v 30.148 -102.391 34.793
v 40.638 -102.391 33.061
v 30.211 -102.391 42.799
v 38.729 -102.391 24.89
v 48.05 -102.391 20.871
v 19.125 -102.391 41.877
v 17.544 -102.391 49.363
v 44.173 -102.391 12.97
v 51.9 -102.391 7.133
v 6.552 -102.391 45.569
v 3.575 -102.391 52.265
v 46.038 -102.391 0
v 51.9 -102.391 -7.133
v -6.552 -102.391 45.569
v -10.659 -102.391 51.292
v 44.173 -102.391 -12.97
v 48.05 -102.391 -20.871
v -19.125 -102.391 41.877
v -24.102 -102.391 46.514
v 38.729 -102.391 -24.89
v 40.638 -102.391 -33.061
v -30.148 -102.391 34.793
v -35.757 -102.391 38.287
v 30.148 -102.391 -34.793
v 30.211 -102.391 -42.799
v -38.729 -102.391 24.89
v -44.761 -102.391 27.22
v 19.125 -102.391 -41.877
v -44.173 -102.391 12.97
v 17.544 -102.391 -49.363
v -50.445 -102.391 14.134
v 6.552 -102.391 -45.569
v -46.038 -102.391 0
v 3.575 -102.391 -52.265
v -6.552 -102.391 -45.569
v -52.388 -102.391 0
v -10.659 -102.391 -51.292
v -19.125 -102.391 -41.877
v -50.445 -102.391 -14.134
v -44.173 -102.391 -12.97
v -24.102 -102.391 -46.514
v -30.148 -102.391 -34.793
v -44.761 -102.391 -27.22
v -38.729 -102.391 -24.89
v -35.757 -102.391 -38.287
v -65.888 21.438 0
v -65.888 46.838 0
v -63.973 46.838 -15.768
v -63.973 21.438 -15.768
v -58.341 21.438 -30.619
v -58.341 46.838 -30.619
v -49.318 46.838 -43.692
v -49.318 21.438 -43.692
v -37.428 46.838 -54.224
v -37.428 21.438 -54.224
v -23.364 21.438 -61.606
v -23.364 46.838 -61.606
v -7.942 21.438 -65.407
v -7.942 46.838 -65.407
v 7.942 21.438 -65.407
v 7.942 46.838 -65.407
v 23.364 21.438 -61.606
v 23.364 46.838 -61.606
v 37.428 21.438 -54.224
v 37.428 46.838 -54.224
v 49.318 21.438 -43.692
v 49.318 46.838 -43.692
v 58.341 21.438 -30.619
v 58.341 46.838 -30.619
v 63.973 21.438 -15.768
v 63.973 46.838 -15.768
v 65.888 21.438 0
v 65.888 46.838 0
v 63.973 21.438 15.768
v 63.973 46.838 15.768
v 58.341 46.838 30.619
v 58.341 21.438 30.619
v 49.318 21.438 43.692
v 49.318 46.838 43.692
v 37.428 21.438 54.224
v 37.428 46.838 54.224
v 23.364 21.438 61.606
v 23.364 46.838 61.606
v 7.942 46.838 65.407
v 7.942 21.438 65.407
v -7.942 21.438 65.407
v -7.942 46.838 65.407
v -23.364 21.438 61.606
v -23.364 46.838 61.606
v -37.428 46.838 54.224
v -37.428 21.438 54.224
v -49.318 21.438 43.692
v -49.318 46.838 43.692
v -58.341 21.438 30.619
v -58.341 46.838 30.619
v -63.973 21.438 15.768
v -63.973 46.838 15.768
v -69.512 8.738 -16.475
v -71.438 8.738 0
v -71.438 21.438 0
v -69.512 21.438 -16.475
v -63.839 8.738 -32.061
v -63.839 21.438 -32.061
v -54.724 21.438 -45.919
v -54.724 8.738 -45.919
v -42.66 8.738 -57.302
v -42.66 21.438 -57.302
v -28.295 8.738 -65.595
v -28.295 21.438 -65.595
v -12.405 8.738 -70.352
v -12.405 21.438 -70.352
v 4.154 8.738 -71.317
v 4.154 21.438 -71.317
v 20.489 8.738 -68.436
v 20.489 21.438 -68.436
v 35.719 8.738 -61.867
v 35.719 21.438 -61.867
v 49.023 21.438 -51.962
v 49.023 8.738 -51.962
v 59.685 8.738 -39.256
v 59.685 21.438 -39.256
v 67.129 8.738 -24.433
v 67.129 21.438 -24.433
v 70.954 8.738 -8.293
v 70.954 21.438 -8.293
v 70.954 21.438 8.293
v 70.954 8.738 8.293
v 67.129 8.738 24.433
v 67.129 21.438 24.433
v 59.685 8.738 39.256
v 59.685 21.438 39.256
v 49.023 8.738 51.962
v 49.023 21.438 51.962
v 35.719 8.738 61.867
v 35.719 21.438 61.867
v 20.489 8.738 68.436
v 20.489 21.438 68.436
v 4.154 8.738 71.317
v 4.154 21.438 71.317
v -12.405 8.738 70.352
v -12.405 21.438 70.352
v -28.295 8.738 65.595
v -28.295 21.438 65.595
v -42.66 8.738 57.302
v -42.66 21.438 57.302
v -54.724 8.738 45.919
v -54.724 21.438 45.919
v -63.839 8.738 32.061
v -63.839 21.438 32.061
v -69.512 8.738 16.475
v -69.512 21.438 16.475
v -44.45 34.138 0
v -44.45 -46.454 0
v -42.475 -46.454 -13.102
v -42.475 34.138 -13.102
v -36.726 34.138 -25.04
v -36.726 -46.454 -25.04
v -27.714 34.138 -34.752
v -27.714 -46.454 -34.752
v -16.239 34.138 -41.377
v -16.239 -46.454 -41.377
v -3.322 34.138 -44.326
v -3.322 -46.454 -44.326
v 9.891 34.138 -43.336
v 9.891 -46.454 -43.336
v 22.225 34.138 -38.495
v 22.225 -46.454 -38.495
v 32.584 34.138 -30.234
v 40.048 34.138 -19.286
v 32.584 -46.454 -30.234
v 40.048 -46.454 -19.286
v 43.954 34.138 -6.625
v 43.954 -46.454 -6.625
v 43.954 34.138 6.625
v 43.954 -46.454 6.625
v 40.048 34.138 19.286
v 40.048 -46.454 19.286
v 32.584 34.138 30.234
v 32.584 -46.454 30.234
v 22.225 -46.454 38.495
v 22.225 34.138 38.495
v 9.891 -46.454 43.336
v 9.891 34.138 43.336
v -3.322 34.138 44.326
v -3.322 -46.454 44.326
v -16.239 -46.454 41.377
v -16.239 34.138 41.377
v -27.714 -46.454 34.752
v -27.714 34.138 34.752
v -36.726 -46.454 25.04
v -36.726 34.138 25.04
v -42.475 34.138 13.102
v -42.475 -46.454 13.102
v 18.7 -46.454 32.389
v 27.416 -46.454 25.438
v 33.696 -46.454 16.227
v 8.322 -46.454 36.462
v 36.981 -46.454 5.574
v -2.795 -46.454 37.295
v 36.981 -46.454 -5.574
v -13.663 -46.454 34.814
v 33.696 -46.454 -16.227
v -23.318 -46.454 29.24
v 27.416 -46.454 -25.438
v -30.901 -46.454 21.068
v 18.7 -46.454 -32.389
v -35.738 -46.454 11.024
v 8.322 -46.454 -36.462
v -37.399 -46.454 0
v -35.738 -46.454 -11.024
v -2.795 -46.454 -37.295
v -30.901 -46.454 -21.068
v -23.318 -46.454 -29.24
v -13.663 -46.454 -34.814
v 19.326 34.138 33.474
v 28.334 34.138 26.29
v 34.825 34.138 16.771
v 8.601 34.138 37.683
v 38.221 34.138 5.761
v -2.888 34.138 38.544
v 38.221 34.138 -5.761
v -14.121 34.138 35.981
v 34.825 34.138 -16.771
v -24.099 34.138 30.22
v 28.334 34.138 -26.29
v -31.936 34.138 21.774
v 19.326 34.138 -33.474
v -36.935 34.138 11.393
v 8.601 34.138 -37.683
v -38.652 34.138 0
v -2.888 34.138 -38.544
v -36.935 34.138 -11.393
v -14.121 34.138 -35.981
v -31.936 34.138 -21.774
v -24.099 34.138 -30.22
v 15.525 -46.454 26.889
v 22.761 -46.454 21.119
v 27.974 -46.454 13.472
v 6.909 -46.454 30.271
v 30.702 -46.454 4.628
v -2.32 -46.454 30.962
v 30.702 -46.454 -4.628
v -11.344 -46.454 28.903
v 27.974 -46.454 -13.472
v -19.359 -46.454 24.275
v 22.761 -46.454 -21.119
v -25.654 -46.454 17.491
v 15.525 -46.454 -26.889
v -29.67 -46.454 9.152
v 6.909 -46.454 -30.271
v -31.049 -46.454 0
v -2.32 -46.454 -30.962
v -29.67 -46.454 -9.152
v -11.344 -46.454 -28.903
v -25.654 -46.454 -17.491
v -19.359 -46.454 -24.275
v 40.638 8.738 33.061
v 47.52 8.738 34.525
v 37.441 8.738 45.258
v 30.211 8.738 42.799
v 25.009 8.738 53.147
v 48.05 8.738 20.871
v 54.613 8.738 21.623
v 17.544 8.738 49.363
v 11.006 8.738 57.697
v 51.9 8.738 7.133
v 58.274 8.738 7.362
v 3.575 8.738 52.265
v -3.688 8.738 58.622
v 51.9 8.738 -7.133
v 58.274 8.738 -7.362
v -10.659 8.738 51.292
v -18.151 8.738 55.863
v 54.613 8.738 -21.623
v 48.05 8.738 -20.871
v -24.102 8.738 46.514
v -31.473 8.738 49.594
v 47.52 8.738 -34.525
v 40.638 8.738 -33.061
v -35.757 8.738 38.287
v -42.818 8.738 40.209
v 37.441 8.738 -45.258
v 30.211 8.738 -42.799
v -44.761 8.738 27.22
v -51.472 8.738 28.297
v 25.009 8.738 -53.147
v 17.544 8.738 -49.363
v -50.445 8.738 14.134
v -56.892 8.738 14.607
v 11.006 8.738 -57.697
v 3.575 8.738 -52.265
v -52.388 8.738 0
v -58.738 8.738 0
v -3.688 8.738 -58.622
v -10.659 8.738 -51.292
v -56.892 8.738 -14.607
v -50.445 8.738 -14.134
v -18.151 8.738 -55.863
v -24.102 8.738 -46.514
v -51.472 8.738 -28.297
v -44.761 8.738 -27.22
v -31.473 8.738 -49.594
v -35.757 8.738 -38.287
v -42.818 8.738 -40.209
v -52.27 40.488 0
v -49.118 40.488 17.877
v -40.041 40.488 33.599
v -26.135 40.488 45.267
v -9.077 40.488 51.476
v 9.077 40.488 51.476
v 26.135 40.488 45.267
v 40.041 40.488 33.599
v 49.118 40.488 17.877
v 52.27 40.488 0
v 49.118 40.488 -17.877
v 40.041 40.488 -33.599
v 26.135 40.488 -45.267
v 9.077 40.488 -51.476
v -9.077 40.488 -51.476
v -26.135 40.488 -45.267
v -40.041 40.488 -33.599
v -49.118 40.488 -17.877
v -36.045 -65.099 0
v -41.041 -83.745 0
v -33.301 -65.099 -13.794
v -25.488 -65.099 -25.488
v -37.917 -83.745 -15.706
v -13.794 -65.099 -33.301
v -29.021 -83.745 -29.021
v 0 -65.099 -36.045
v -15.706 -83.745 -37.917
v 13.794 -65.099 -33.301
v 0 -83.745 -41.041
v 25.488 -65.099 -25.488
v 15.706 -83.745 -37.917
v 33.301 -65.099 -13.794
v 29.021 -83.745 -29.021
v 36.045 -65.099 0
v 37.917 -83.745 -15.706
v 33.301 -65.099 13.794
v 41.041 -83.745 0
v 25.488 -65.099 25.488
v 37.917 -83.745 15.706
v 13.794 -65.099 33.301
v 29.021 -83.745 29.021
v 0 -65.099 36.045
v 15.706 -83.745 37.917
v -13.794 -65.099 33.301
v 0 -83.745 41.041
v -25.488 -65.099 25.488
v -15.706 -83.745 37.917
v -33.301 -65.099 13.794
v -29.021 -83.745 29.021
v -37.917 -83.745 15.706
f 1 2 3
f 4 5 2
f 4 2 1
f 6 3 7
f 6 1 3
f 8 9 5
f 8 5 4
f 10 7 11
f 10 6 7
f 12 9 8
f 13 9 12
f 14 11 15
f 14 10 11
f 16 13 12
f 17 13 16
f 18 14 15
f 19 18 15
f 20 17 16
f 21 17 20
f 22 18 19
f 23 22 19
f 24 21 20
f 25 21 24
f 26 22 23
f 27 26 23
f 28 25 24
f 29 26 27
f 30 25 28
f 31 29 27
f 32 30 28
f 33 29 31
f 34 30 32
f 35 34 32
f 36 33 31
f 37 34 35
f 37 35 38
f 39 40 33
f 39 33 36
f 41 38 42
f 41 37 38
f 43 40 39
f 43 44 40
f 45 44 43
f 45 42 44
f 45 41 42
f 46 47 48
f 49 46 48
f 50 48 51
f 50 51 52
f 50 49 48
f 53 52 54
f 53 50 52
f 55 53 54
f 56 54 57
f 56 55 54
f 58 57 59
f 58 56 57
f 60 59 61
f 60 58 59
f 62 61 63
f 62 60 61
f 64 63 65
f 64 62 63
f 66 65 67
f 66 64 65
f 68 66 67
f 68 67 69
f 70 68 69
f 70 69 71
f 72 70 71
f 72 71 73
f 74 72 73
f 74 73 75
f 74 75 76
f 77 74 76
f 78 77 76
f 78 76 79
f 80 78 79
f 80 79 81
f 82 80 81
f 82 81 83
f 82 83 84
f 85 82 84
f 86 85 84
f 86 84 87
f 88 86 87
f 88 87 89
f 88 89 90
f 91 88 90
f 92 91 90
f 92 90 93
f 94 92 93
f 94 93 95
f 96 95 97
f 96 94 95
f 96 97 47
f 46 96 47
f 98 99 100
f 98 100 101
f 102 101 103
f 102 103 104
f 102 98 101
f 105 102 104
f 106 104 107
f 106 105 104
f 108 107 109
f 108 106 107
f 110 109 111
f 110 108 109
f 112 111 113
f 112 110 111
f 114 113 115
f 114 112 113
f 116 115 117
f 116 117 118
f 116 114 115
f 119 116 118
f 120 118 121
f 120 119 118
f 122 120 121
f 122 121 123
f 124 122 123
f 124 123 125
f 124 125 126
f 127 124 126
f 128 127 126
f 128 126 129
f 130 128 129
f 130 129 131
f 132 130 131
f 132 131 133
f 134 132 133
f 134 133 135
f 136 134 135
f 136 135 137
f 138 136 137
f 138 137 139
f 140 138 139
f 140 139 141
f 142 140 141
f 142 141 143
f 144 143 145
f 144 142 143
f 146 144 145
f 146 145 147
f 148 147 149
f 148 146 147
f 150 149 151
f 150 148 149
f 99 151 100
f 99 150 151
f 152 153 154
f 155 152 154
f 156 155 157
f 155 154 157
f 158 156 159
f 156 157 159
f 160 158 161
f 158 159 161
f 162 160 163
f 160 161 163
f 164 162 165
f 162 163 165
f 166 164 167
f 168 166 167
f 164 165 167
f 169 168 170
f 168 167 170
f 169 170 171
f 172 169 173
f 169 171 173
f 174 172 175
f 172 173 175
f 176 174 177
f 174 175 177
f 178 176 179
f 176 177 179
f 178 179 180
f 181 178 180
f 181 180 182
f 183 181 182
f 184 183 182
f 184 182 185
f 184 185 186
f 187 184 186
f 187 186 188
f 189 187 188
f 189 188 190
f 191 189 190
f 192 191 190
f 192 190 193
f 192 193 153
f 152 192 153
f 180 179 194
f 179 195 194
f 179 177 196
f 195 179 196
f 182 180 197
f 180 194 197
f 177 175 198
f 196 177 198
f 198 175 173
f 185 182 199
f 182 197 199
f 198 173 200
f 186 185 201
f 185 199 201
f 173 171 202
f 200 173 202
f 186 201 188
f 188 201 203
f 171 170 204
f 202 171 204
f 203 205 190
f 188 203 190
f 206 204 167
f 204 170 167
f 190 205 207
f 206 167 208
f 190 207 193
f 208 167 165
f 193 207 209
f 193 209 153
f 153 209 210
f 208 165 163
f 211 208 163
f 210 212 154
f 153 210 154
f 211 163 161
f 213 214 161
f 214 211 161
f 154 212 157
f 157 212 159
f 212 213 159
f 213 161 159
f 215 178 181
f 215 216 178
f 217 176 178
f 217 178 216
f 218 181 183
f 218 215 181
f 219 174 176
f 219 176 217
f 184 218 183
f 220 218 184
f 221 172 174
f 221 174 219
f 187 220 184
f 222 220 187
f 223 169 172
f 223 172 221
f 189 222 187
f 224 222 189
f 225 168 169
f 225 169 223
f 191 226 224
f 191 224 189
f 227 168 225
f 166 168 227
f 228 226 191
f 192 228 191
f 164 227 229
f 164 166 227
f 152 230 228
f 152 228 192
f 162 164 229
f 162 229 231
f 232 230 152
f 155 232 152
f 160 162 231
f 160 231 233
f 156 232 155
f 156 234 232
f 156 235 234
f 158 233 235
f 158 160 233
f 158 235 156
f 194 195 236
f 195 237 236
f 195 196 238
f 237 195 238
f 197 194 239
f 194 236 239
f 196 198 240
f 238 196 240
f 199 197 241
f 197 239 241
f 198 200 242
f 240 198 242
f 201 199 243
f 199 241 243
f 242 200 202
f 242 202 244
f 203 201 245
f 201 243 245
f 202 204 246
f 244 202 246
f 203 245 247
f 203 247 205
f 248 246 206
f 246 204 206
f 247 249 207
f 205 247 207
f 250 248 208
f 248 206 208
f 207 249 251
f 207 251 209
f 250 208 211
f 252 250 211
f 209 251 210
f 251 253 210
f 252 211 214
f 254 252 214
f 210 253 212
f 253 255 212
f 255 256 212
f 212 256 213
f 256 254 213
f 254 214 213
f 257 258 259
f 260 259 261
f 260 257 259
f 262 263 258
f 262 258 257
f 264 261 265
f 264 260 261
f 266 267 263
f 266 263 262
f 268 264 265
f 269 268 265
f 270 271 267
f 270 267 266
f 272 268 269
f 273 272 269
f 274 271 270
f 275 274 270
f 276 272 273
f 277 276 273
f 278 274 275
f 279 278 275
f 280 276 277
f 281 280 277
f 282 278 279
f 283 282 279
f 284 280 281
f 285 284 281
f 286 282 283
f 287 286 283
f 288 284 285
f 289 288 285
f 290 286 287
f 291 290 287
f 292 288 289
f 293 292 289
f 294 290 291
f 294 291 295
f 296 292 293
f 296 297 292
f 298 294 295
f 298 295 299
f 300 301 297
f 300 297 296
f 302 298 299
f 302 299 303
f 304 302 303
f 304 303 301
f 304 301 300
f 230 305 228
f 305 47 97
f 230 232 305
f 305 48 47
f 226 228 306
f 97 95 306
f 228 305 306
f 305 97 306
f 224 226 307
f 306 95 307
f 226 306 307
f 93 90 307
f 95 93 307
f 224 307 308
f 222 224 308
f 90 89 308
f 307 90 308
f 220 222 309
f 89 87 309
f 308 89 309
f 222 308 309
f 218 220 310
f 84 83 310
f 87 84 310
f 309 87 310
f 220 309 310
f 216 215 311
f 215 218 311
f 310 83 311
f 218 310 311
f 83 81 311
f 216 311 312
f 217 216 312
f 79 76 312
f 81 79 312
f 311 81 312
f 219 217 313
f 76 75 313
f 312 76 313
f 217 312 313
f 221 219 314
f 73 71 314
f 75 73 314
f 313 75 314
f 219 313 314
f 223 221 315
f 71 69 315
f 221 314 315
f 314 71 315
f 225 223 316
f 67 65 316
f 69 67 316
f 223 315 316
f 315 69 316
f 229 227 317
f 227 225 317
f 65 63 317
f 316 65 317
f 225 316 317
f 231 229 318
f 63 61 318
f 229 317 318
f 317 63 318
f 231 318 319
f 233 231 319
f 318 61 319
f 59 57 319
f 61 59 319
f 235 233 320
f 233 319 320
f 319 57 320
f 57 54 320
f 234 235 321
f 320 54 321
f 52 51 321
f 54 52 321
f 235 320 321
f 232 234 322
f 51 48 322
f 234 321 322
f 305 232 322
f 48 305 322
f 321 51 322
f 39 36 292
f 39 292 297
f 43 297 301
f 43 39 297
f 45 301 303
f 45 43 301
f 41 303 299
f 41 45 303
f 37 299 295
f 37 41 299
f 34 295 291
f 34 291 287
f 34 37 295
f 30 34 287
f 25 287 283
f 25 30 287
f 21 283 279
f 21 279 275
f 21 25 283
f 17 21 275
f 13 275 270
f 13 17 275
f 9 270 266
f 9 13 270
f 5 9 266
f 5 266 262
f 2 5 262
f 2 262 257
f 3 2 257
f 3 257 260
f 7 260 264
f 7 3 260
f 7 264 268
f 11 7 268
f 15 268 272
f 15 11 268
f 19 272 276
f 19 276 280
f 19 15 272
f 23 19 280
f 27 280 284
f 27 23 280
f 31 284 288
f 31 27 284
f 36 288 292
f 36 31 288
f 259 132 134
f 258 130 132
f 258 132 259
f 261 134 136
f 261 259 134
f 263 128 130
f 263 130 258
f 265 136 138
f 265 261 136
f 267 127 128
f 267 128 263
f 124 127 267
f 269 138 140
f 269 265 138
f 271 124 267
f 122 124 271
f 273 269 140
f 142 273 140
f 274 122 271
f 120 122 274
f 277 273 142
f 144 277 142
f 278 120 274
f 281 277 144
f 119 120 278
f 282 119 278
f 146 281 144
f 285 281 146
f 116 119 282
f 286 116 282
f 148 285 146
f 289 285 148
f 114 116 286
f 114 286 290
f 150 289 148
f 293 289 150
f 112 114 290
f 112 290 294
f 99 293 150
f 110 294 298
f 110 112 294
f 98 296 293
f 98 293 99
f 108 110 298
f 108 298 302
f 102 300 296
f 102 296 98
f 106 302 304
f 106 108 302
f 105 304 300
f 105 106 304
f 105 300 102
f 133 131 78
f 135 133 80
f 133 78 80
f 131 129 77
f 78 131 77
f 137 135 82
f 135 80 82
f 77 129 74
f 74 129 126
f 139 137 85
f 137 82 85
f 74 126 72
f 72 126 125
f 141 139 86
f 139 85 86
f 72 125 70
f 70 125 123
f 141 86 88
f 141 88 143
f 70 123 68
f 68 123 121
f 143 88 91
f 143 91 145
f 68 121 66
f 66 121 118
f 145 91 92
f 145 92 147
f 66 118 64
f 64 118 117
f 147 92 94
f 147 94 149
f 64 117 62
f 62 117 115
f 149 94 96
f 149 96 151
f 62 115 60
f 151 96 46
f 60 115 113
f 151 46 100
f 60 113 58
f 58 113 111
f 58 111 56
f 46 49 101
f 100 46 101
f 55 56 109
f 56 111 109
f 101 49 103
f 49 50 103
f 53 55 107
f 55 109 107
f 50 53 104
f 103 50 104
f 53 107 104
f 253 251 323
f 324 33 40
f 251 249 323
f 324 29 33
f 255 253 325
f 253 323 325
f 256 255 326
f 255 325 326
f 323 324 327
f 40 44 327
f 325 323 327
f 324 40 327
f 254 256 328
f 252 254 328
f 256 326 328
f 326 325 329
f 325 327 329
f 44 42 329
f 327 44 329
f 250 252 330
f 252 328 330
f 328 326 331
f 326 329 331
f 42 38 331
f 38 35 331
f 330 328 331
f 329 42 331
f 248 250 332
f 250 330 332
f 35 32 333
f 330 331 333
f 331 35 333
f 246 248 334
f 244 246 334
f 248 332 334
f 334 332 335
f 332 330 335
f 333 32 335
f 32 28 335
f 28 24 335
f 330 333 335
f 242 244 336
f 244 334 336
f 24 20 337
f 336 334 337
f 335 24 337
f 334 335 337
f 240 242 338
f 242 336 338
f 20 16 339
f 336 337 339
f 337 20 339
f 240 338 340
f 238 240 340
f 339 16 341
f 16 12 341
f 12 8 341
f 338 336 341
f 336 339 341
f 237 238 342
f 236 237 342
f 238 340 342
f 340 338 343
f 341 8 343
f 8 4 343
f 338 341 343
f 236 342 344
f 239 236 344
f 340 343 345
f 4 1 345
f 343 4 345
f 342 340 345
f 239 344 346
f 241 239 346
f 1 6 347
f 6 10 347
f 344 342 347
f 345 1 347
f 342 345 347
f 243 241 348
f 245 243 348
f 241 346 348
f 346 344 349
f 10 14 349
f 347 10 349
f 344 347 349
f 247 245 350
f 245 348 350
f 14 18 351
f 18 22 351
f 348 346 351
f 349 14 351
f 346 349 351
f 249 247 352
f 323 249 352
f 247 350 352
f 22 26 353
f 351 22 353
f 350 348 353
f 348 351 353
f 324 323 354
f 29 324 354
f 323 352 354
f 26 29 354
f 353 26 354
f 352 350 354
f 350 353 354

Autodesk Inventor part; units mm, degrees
ref_plane "YZ Plane" through (0, 0, 0) normal (1, 0, 0) x (0, 1, 0)
ref_plane "XZ Plane" through (0, 0, 0) normal (0, 1, 0) x (-1, 0, 0)
ref_plane "XY Plane" through (0, 0, 0) normal (0, 0, 1) x (1, 0, 0)
sketch "Sketch1" plane through (0, 0, 0) normal (0, 0, 1) x (1, 0, 0)
  arc A0 (-19.4827, -3.287) -> (-19.05, 0) centre (-31.75, 0) ccw
  line L0 (-19.4827, -3.287) -> (-58.7375, -149.7878)
  line L1 (-65.8876, 46.8376) -> (-65.8876, 21.4376)
  line L2 (-65.8876, 21.4376) -> (-71.4375, 21.4376)
  line L3 (-44.45, 34.1376) -> (-38.6524, 34.1376)
  line L4 (-44.45, 34.1376) -> (0, 34.1376) construction
  line L5 (-37.3992, -46.4536) -> (-31.0492, -46.4536)
  line L6 (-71.4375, 21.4376) -> (-71.4375, 8.7376)
  line L7 (-71.4375, 8.7376) -> (-58.7375, 8.7376)
  line L8 (-58.7375, 8.7376) -> (-52.3875, 8.7376)
  line L9 (-52.3875, 8.7376) -> (-52.3875, -102.3907)
  line L10 (-71.4375, 8.7376) -> (-71.4375, -0.7874)
  line L11 (-71.4375, 8.7376) -> (-61.9125, 8.7376) construction
  line L12 (-71.4375, -0.7874) -> (-58.7375, -0.7874)
  line L13 (-58.7375, -0.7874) -> (-58.7375, -51.5874)
  line L14 (-58.7375, -51.5874) -> (-71.4375, -51.5874)
  line L15 (-71.4375, -0.7874) -> (-65.0875, -0.7874)
  line L16 (-65.0875, -0.7874) -> (-65.0875, -6.731)
  line L17 (-65.0875, -6.731) -> (-71.4375, -6.731)
  line L18 (-71.4375, 21.4376) -> (-71.4375, -0.7874)
  line L19 (-71.4375, -6.731) -> (-71.4375, -51.5874)
  line L20 (-58.7375, -51.5874) -> (-58.7375, -126.0892)
  line L21 (-58.7375, -51.5874) -> (0, -51.5874) construction
  line L22 (-46.0375, -102.3907) -> (-52.3875, -102.3907)
  line L23 (-65.0875, -51.5907) -> (-58.7375, -51.5907)
  line L24 (-58.7375, -149.7878) -> (-61.9125, -161.637)
  line L25 (-58.7375, -149.7878) -> (-34.203, -149.7878) construction
  line L26 (-65.0875, -161.637) -> (-61.9125, -161.637)
  line L27 (-58.7375, -126.0892) -> (-52.3875, -126.0892)
  line L28 (0, 34.1376) -> (0, 0)
  line L29 (-65.0875, -100.6892) -> (-65.0875, -161.637)
  line L30 (-58.7375, -51.5907) -> (-61.9125, -51.5907)
  line L31 (-65.0875, -100.6892) -> (-58.7375, -100.6892)
  line L32 (-65.8876, 46.8376) -> (-18.3062, 46.8376) construction
  line L33 (-65.8876, 46.8376) -> (-14.7047, 46.8376) construction
  line L34 (-65.8876, 46.8376) -> (-33.5957, 31.7796)
  line L35 (-65.8876, 46.8376) -> (-30.2574, 46.8376) construction
  arc A1 (-19.05, 0) -> (-33.5957, 31.7796) centre (-61.0391, 0) ccw
  line L36 (-44.45, 34.1376) -> (-44.45, -46.4536)
  line L37 (-44.45, 34.1376) -> (36.1412, 34.1376) construction
  line L38 (-44.45, -46.4536) -> (-37.3992, -46.4536)
  dimension "d86" = 19.05
  dimension "d87" = 25.4
  dimension "d88" = 5.5499
  dimension "d89" = 65.8876
  dimension "d90" = 12.7
  dimension "d91" = 12.7
  dimension "d92" = 44.45
  dimension "d93" = 6.35
  dimension "d94" = 105
  dimension "d95" = 12.7
  dimension "d96" = 12.7
  dimension "d97" = 6.35
  dimension "d98" = 9.525
  dimension "d99" = 50.8
  dimension "d100" = 12.7
  dimension "d101" = 6.35
  dimension "d102" = 5.9436
  dimension "d103" = 6.35
  dimension "d104" = 50.8
  dimension "d105" = 6.35
  dimension "d106" = 105
  dimension "d107" = 3.175
  dimension "d108" = 6.35
  dimension "d109" = 60.9478
  dimension "d110" = 3.175
  dimension "d111" = 6.35
  dimension "d112" = 25.4
  dimension "d113" = 25
  dimension "d114" = 41.9891
  dimension "d115" = 32.2919
  dimension "d116" = 90
  dimension "d117" = 80.5912
revolve "Revolution1" add sketch "Sketch1" angle 360 about axis through (0, 34.1376, 0) along (0, -1, 0) contours L0 L22 L9 L8 L7 L6 L2 L1 L34 L3 L36 L38 L5
properties part number "Phenolic" material "Phenolic Resin"
